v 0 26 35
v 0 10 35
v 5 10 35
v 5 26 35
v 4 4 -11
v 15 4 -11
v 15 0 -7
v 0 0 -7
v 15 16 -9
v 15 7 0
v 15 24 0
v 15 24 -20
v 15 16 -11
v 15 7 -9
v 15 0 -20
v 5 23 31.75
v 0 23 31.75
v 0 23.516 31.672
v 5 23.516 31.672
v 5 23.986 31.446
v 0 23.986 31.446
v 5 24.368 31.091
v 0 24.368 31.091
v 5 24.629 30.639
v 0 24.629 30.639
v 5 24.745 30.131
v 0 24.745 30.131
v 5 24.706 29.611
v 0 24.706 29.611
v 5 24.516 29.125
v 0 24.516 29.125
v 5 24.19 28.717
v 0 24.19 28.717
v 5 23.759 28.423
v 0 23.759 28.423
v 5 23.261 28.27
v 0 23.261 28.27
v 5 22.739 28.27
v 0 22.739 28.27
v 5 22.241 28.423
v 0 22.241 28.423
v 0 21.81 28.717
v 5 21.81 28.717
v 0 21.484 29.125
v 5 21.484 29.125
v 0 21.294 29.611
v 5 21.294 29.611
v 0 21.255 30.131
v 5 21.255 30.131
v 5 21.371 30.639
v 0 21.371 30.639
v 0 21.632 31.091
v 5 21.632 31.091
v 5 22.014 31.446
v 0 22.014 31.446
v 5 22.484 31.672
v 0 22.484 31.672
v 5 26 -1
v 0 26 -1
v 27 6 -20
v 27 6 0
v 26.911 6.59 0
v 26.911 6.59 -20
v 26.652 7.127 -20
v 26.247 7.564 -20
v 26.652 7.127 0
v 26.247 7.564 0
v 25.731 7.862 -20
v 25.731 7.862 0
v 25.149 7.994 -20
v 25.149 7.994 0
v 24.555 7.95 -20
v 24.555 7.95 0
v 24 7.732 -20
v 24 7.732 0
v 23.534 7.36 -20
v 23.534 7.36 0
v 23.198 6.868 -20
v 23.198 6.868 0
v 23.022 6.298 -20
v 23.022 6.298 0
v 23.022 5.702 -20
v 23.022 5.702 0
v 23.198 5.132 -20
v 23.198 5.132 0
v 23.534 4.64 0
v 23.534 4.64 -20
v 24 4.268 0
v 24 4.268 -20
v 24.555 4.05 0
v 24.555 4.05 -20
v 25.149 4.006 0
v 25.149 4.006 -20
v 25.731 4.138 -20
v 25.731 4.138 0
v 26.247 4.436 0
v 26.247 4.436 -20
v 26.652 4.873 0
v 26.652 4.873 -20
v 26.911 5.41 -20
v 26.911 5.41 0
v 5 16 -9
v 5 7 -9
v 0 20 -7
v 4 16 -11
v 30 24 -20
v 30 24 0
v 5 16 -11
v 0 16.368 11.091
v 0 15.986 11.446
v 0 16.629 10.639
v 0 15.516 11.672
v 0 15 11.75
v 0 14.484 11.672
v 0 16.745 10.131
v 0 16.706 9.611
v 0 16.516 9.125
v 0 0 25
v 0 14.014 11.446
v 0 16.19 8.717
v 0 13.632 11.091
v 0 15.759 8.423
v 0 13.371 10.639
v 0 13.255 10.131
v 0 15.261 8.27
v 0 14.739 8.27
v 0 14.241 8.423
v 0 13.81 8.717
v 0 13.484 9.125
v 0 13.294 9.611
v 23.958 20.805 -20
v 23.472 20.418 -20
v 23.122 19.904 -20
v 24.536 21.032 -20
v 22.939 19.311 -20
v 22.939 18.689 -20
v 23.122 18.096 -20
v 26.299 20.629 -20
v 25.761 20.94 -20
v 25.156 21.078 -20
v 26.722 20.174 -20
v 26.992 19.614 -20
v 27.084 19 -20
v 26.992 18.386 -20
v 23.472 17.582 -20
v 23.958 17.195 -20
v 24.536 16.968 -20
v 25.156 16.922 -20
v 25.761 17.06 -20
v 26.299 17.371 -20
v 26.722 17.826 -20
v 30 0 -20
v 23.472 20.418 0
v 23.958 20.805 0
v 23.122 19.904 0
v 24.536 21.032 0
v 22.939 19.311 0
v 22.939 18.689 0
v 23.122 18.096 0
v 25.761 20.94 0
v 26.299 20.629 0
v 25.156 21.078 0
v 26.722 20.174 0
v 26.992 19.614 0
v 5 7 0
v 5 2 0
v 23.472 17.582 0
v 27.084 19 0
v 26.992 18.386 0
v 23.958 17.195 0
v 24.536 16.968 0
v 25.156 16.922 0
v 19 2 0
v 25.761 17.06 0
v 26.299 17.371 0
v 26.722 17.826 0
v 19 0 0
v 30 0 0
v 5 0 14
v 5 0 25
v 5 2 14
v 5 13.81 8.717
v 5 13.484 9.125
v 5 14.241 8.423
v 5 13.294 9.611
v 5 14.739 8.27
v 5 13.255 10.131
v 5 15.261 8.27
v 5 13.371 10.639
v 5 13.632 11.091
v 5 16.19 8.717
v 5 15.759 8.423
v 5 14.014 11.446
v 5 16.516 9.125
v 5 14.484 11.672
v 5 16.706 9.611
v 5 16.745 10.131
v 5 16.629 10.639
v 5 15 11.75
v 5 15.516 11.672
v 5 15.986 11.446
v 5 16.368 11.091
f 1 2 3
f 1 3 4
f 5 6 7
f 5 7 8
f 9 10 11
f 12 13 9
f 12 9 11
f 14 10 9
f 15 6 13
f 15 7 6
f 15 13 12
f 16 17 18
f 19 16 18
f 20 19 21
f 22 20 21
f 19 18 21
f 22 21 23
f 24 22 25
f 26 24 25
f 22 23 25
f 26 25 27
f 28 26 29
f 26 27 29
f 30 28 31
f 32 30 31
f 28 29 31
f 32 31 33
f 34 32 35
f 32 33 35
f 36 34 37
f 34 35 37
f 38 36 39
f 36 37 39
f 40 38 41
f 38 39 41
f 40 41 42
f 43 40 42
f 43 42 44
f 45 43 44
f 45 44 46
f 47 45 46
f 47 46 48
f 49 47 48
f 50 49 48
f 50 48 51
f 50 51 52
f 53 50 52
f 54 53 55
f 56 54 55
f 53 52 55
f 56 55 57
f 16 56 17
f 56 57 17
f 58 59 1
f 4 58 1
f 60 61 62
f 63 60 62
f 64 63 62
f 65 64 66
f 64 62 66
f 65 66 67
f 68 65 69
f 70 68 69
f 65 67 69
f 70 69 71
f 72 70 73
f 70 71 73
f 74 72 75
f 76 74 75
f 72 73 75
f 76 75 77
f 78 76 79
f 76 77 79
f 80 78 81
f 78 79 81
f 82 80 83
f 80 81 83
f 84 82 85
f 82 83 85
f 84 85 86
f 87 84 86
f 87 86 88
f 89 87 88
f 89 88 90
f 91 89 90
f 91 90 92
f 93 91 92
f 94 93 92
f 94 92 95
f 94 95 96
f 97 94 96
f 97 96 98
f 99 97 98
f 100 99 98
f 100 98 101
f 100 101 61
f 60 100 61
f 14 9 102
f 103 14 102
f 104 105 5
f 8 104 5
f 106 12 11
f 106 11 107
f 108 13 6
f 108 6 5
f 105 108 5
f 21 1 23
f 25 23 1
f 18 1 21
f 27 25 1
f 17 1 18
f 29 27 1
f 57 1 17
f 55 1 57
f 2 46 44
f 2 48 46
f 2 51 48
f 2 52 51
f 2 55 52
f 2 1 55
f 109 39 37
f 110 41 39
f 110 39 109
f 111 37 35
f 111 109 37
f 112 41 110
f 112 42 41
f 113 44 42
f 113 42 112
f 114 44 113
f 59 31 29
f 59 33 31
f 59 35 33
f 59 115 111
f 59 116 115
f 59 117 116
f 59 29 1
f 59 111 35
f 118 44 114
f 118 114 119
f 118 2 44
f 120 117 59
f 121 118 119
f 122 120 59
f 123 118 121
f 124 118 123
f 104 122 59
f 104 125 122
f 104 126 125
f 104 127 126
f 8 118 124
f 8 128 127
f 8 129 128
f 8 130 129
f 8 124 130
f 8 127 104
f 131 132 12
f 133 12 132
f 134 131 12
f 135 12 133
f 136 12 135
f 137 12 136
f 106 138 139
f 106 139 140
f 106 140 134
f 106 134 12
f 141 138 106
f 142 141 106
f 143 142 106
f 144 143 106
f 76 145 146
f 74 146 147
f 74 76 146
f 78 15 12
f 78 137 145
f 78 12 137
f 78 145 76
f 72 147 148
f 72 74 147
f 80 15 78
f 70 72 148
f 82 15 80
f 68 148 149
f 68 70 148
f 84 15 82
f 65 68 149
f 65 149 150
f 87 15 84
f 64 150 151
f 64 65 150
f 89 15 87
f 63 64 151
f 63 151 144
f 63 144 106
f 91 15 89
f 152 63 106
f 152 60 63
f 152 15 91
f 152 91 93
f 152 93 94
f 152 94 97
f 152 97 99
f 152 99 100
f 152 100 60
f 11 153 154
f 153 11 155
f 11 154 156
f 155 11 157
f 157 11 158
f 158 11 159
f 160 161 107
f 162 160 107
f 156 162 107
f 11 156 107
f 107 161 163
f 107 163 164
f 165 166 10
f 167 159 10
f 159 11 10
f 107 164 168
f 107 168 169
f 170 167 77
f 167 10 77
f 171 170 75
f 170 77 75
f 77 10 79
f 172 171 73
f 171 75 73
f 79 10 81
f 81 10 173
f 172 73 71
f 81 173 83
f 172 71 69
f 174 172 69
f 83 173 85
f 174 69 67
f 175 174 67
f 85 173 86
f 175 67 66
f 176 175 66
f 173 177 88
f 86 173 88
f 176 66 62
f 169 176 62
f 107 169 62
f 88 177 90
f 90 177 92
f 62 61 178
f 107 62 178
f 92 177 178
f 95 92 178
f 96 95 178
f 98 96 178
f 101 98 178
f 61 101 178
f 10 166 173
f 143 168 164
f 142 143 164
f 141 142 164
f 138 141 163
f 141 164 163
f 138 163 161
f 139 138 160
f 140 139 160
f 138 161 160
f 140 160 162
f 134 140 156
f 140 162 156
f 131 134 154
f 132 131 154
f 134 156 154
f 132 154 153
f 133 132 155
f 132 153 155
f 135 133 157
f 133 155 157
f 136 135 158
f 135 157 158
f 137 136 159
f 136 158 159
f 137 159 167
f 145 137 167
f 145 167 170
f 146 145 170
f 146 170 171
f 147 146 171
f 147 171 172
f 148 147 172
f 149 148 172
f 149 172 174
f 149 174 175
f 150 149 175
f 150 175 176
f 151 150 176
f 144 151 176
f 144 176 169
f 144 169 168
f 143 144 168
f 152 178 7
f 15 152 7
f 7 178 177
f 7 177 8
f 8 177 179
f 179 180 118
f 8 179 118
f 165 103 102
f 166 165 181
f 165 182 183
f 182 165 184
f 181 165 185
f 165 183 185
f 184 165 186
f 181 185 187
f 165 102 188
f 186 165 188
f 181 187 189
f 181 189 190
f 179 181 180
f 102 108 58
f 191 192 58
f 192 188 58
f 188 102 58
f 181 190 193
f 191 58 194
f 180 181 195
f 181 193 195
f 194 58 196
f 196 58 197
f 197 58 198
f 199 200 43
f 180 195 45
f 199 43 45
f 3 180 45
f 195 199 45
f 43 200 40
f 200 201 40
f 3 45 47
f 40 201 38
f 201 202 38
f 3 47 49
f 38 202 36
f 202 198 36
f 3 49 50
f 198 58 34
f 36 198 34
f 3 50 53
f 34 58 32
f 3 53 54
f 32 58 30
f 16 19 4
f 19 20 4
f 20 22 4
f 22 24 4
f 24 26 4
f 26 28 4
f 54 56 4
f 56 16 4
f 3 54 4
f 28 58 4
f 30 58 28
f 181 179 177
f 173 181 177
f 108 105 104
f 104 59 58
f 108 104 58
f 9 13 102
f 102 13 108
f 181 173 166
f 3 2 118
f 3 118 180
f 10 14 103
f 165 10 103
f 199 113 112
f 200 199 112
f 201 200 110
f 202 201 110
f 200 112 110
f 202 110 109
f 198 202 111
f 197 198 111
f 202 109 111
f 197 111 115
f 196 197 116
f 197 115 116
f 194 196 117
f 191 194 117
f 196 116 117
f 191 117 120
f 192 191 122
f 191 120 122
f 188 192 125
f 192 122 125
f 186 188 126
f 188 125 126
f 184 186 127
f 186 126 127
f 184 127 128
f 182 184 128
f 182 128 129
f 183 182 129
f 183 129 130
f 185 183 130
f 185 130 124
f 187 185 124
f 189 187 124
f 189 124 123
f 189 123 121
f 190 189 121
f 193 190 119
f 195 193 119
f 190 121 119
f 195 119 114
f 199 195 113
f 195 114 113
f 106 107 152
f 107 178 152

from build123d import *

# Parameters (mm, degrees)
EXTRUDE_1_DEPTH     = 12
CUT_EXTRUDE_1_REACH = 22
SKETCH_2_R          = 2
SKETCH_3_W          = 46
SKETCH_3_H          = 26
SKETCH_3_R          = 1.75
EXTRUDE_2_DEPTH     = 5
CHAMFER_1_SIZE      = 10
EXTRUDE_3_DEPTH     = 2
CHAMFER_2_SIZE      = 10
SKETCH_5_W          = 15
SKETCH_5_H          = 20
EXTRUDE_4_DEPTH     = 12
SKETCH_6_R          = 2.084127943
CUT_EXTRUDE_2_DEPTH = 21
SKETCH_7_W          = 10
SKETCH_7_H          = 5
CUT_EXTRUDE_3_DEPTH = 47
SKETCH_8_W          = 10
SKETCH_8_H          = 9
EXTRUDE_5_DEPTH     = 2
CHAMFER_3_SIZE      = 4


with BuildPart() as part:
    # Эскиз1 → Бобышка-Вытянуть1 (new body)
    with BuildSketch(Plane(origin=(0, 0, 0), x_dir=(1, 0, 0), z_dir=(0, 1, 0))):
        Polygon((0, 0), (0, 11), (15, 11), (15, 20), (30, 20), (30, 0), align=None)
    extrude(amount=EXTRUDE_1_DEPTH)

    # Эскиз2 → Вырез-Вытянуть1 (cut, up to next)
    with BuildSketch(Plane.XY, mode=Mode.PRIVATE) as cut_extrude_1_sk1:
        with Locations((25, 6)):
            Circle(SKETCH_2_R)
    cut_extrude_1_tool1 = extrude(cut_extrude_1_sk1.sketch, amount=-CUT_EXTRUDE_1_REACH, mode=Mode.PRIVATE) & part.part
    add(cut_extrude_1_tool1.solids().sort_by_distance((25, 6, 0))[0], mode=Mode.SUBTRACT)

    # Эскиз3 → Бобышка-Вытянуть2 (add)
    with BuildSketch(Plane.ZY):
        with Locations((12, 13)):
            Rectangle(SKETCH_3_W, SKETCH_3_H)
        with Locations((30, 23)):
            Circle(SKETCH_3_R, mode=Mode.SUBTRACT)
        with Locations((10, 15)):
            Circle(SKETCH_3_R, mode=Mode.SUBTRACT)
    extrude(amount=-EXTRUDE_2_DEPTH)

    # Фаска1
    chamfer_1_edges = [part.edges().sort_by_distance(p)[0] for p in [
        (2.5, 26, -11),
    ]]
    chamfer(chamfer_1_edges, length=CHAMFER_1_SIZE)

    # Эскиз4 → Бобышка-Вытянуть3 (add)
    with BuildSketch(Plane.XZ):
        Polygon((5, 14), (19, 0), (5, 0), align=None)
    extrude(amount=-EXTRUDE_3_DEPTH)

    # Фаска2
    chamfer_2_edges = [part.edges().sort_by_distance(p)[0] for p in [
        (2.5, 0, 35),
    ]]
    chamfer(chamfer_2_edges, length=CHAMFER_2_SIZE)

    # Эскиз5 → Бобышка-Вытянуть4 (add)
    with BuildSketch(Plane(origin=(0, 12, 0), x_dir=(1, 0, 0), z_dir=(0, 1, 0))):
        with Locations((22.5, 10)):
            Rectangle(SKETCH_5_W, SKETCH_5_H)
    extrude(amount=EXTRUDE_4_DEPTH)

    # Эскиз6 → Вырез-Вытянуть2 (cut, through all)
    with BuildSketch(Plane.XY):
        with Locations((25, 19)):
            Circle(SKETCH_6_R)
    extrude(amount=-CUT_EXTRUDE_2_DEPTH, mode=Mode.SUBTRACT)

    # Эскиз7 → Вырез-Вытянуть3 (cut, through all)
    with BuildSketch(Plane(origin=(0, 0, -11), x_dir=(-1, 0, 0), z_dir=(0, 0, -1))):
        with Locations((-10, 9.5)):
            Rectangle(SKETCH_7_W, SKETCH_7_H)
    extrude(amount=-CUT_EXTRUDE_3_DEPTH, mode=Mode.SUBTRACT)

    # Эскиз8 → Бобышка-Вытянуть5 (add)
    with BuildSketch(Plane(origin=(0, 0, -11), x_dir=(-1, 0, 0), z_dir=(0, 0, -1))):
        with Locations((-10, 11.5)):
            Rectangle(SKETCH_8_W, SKETCH_8_H)
    extrude(amount=-EXTRUDE_5_DEPTH)

    # Фаска3
    chamfer_3_edges = [part.edges().sort_by_distance(p)[0] for p in [
        (0, 8, -11),
        (7.5, 0, -11),
    ]]
    chamfer(chamfer_3_edges, length=CHAMFER_3_SIZE)


solid = part.part
